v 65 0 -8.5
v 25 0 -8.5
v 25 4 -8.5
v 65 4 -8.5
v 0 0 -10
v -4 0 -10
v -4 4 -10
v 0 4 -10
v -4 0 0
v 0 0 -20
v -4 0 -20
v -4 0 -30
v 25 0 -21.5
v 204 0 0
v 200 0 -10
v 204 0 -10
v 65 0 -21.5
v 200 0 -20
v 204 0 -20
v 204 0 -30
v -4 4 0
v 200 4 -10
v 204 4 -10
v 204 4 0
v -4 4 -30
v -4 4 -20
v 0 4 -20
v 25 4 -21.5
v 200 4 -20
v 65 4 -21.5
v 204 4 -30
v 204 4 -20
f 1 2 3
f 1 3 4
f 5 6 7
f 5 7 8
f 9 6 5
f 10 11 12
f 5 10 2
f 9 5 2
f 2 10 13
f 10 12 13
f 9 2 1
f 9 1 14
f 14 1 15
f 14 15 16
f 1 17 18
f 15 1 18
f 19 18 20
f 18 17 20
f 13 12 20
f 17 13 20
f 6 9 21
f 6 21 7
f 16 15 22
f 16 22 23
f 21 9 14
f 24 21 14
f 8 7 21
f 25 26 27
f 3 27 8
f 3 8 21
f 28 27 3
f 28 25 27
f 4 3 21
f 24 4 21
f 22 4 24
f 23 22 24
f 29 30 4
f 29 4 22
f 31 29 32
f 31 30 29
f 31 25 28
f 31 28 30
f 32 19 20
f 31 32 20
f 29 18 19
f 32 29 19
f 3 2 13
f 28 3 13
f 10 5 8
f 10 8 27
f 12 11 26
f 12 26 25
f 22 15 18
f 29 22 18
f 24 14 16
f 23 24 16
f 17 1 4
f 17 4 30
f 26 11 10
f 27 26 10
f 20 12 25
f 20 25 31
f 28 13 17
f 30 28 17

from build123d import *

# Parameters (mm, degrees)
SKETCH1_W           = 200
SKETCH1_H           = 30
SKETCH1_W_2         = 40
SKETCH1_H_2         = 13
SKETCH1_W_3         = 4
SKETCH1_H_3         = 10
BOSS_EXTRUDE1_DEPTH = 4


with BuildPart() as part:
    # Sketch1 → Boss-Extrude1 (new body)
    # profile 1 of 5: a face of its own
    with BuildSketch(Plane(origin=(0, 0, 0), x_dir=(1, 0, 0), z_dir=(0, 1, 0))):
        with Locations((100, 15)):
            Rectangle(SKETCH1_W, SKETCH1_H)
        with Locations((45, 15)):
            Rectangle(SKETCH1_W_2, SKETCH1_H_2, mode=Mode.SUBTRACT)
    # profile 2 of 5: a face of its own
    with BuildSketch(Plane(origin=(0, 0, 0), x_dir=(1, 0, 0), z_dir=(0, 1, 0))):
        with Locations((-2, 5)):
            Rectangle(SKETCH1_W_3, SKETCH1_H_3)
    # profile 3 of 5: a face of its own
    with BuildSketch(Plane(origin=(0, 0, 0), x_dir=(1, 0, 0), z_dir=(0, 1, 0))):
        with Locations((-2, 25)):
            Rectangle(SKETCH1_W_3, SKETCH1_H_3)
    # profile 4 of 5: a face of its own
    with BuildSketch(Plane(origin=(0, 0, 0), x_dir=(1, 0, 0), z_dir=(0, 1, 0))):
        with Locations((202, 25)):
            Rectangle(SKETCH1_W_3, SKETCH1_H_3)
    # profile 5 of 5: a face of its own
    with BuildSketch(Plane(origin=(0, 0, 0), x_dir=(1, 0, 0), z_dir=(0, 1, 0))):
        with Locations((202, 5)):
            Rectangle(SKETCH1_W_3, SKETCH1_H_3)
    extrude(amount=BOSS_EXTRUDE1_DEPTH)


solid = part.part
